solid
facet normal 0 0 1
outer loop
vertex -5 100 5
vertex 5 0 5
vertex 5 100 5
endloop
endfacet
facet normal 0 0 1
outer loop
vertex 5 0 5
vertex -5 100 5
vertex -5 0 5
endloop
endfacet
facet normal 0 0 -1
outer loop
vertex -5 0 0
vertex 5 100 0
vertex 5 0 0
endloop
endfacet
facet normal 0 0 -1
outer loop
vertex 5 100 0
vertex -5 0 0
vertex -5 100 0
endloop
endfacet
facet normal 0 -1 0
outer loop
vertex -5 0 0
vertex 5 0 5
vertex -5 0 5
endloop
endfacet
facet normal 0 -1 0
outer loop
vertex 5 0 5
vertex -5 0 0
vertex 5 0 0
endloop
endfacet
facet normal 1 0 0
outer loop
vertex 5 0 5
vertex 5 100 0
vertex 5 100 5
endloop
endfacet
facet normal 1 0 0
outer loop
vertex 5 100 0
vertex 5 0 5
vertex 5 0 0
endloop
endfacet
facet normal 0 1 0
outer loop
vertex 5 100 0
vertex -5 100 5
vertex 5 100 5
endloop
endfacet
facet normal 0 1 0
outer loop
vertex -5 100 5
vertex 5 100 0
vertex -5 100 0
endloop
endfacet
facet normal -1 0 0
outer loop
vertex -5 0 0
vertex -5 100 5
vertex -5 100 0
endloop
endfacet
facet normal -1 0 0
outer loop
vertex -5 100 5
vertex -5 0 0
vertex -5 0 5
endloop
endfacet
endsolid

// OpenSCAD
// Steel cantilever 100 x 10 x 5 mm, clamped at y = 0, 50 N on the free end (-z).
// Beam theory: deflection F L^3 / (3 E I) = 50 * 100^3 / (3 * 200000 * 10*5^3/12) = 0.80 mm
//   max stress 6 F L / (b h^2) = 6 * 50 * 100 / (10 * 25) = 120 MPa

beam_len = 100;

//@sim material=pla
module beam() color("gray") translate([-5, 0, 0]) cube([10, beam_len, 5]);

//@sim fixed
module wall() color("green") translate([-6, -1, -1]) cube([12, 1.1, 7]);

//@sim load force=[0,0,50]
module tip() color("red") translate([-6, beam_len-0.1, -1]) cube([12, 1.1, 7]);

beam();
%wall();
%tip();
